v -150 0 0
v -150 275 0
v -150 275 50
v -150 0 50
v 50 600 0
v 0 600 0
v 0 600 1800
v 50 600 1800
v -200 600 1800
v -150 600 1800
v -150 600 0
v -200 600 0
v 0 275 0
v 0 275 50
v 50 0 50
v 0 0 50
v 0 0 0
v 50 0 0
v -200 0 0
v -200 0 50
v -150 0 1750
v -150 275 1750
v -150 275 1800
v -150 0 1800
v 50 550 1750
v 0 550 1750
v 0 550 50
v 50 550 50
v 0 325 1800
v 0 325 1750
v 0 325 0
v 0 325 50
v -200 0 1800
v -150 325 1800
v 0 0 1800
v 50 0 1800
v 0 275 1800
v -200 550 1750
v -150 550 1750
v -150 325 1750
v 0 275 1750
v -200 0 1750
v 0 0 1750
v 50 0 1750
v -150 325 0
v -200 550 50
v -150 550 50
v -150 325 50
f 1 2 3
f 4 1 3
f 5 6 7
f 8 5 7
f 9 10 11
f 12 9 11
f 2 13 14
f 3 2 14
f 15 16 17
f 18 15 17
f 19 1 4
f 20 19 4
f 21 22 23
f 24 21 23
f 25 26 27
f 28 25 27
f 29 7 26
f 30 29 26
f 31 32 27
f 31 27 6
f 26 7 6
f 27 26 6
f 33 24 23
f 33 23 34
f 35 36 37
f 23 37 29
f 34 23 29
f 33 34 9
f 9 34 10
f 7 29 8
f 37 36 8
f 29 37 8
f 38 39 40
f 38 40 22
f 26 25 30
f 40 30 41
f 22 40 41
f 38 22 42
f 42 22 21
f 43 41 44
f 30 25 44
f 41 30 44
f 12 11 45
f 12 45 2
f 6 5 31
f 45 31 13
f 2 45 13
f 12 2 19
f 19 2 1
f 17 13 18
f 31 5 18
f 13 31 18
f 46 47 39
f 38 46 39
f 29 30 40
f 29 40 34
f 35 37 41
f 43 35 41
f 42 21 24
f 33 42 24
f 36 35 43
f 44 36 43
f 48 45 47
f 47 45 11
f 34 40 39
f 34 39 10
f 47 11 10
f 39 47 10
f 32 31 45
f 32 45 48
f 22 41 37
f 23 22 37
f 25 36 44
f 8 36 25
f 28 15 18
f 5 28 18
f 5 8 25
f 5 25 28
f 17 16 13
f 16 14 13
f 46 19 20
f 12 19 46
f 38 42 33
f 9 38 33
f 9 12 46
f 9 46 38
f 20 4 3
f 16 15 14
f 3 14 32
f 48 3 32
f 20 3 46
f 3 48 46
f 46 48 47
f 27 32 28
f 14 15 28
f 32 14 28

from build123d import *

# Parameters (mm, degrees)
SALIENTE_EXTRUIR1_DEPTH = 50
CROQUIS2_W              = 50
CROQUIS2_H              = 50
SALIENTE_EXTRUIR2_DEPTH = 150
SALIENTE_EXTRUIR3_DEPTH = 50


with BuildPart() as part:
    # Croquis1 → Saliente-Extruir1 (new body)
    with BuildSketch(Plane(origin=(0, 0, 0), x_dir=(0, 0, -1), z_dir=(1, 0, 0))):
        Polygon((0, 0), (0, 600), (-1800, 600), (-1800, 0), (-1750, 0), (-1750, 550), (-50, 550), (-50, 0), align=None)
    extrude(amount=SALIENTE_EXTRUIR1_DEPTH)

    # Croquis2 → Saliente-Extruir2 (add)
    with BuildSketch(Plane.ZY):
        with Locations((1775, 300)):
            Rectangle(CROQUIS2_W, CROQUIS2_H)
        with Locations((25, 300)):
            Rectangle(CROQUIS2_W, CROQUIS2_H)
    extrude(amount=SALIENTE_EXTRUIR2_DEPTH)

    # Croquis3 → Saliente-Extruir3 (add)
    with BuildSketch(Plane.ZY.offset(150)):
        Polygon((1750, 0), (1800, 0), (1800, 600), (0, 600), (0, 0), (50, 0), (50, 550), (1750, 550), align=None)
    extrude(amount=SALIENTE_EXTRUIR3_DEPTH)


solid = part.part
